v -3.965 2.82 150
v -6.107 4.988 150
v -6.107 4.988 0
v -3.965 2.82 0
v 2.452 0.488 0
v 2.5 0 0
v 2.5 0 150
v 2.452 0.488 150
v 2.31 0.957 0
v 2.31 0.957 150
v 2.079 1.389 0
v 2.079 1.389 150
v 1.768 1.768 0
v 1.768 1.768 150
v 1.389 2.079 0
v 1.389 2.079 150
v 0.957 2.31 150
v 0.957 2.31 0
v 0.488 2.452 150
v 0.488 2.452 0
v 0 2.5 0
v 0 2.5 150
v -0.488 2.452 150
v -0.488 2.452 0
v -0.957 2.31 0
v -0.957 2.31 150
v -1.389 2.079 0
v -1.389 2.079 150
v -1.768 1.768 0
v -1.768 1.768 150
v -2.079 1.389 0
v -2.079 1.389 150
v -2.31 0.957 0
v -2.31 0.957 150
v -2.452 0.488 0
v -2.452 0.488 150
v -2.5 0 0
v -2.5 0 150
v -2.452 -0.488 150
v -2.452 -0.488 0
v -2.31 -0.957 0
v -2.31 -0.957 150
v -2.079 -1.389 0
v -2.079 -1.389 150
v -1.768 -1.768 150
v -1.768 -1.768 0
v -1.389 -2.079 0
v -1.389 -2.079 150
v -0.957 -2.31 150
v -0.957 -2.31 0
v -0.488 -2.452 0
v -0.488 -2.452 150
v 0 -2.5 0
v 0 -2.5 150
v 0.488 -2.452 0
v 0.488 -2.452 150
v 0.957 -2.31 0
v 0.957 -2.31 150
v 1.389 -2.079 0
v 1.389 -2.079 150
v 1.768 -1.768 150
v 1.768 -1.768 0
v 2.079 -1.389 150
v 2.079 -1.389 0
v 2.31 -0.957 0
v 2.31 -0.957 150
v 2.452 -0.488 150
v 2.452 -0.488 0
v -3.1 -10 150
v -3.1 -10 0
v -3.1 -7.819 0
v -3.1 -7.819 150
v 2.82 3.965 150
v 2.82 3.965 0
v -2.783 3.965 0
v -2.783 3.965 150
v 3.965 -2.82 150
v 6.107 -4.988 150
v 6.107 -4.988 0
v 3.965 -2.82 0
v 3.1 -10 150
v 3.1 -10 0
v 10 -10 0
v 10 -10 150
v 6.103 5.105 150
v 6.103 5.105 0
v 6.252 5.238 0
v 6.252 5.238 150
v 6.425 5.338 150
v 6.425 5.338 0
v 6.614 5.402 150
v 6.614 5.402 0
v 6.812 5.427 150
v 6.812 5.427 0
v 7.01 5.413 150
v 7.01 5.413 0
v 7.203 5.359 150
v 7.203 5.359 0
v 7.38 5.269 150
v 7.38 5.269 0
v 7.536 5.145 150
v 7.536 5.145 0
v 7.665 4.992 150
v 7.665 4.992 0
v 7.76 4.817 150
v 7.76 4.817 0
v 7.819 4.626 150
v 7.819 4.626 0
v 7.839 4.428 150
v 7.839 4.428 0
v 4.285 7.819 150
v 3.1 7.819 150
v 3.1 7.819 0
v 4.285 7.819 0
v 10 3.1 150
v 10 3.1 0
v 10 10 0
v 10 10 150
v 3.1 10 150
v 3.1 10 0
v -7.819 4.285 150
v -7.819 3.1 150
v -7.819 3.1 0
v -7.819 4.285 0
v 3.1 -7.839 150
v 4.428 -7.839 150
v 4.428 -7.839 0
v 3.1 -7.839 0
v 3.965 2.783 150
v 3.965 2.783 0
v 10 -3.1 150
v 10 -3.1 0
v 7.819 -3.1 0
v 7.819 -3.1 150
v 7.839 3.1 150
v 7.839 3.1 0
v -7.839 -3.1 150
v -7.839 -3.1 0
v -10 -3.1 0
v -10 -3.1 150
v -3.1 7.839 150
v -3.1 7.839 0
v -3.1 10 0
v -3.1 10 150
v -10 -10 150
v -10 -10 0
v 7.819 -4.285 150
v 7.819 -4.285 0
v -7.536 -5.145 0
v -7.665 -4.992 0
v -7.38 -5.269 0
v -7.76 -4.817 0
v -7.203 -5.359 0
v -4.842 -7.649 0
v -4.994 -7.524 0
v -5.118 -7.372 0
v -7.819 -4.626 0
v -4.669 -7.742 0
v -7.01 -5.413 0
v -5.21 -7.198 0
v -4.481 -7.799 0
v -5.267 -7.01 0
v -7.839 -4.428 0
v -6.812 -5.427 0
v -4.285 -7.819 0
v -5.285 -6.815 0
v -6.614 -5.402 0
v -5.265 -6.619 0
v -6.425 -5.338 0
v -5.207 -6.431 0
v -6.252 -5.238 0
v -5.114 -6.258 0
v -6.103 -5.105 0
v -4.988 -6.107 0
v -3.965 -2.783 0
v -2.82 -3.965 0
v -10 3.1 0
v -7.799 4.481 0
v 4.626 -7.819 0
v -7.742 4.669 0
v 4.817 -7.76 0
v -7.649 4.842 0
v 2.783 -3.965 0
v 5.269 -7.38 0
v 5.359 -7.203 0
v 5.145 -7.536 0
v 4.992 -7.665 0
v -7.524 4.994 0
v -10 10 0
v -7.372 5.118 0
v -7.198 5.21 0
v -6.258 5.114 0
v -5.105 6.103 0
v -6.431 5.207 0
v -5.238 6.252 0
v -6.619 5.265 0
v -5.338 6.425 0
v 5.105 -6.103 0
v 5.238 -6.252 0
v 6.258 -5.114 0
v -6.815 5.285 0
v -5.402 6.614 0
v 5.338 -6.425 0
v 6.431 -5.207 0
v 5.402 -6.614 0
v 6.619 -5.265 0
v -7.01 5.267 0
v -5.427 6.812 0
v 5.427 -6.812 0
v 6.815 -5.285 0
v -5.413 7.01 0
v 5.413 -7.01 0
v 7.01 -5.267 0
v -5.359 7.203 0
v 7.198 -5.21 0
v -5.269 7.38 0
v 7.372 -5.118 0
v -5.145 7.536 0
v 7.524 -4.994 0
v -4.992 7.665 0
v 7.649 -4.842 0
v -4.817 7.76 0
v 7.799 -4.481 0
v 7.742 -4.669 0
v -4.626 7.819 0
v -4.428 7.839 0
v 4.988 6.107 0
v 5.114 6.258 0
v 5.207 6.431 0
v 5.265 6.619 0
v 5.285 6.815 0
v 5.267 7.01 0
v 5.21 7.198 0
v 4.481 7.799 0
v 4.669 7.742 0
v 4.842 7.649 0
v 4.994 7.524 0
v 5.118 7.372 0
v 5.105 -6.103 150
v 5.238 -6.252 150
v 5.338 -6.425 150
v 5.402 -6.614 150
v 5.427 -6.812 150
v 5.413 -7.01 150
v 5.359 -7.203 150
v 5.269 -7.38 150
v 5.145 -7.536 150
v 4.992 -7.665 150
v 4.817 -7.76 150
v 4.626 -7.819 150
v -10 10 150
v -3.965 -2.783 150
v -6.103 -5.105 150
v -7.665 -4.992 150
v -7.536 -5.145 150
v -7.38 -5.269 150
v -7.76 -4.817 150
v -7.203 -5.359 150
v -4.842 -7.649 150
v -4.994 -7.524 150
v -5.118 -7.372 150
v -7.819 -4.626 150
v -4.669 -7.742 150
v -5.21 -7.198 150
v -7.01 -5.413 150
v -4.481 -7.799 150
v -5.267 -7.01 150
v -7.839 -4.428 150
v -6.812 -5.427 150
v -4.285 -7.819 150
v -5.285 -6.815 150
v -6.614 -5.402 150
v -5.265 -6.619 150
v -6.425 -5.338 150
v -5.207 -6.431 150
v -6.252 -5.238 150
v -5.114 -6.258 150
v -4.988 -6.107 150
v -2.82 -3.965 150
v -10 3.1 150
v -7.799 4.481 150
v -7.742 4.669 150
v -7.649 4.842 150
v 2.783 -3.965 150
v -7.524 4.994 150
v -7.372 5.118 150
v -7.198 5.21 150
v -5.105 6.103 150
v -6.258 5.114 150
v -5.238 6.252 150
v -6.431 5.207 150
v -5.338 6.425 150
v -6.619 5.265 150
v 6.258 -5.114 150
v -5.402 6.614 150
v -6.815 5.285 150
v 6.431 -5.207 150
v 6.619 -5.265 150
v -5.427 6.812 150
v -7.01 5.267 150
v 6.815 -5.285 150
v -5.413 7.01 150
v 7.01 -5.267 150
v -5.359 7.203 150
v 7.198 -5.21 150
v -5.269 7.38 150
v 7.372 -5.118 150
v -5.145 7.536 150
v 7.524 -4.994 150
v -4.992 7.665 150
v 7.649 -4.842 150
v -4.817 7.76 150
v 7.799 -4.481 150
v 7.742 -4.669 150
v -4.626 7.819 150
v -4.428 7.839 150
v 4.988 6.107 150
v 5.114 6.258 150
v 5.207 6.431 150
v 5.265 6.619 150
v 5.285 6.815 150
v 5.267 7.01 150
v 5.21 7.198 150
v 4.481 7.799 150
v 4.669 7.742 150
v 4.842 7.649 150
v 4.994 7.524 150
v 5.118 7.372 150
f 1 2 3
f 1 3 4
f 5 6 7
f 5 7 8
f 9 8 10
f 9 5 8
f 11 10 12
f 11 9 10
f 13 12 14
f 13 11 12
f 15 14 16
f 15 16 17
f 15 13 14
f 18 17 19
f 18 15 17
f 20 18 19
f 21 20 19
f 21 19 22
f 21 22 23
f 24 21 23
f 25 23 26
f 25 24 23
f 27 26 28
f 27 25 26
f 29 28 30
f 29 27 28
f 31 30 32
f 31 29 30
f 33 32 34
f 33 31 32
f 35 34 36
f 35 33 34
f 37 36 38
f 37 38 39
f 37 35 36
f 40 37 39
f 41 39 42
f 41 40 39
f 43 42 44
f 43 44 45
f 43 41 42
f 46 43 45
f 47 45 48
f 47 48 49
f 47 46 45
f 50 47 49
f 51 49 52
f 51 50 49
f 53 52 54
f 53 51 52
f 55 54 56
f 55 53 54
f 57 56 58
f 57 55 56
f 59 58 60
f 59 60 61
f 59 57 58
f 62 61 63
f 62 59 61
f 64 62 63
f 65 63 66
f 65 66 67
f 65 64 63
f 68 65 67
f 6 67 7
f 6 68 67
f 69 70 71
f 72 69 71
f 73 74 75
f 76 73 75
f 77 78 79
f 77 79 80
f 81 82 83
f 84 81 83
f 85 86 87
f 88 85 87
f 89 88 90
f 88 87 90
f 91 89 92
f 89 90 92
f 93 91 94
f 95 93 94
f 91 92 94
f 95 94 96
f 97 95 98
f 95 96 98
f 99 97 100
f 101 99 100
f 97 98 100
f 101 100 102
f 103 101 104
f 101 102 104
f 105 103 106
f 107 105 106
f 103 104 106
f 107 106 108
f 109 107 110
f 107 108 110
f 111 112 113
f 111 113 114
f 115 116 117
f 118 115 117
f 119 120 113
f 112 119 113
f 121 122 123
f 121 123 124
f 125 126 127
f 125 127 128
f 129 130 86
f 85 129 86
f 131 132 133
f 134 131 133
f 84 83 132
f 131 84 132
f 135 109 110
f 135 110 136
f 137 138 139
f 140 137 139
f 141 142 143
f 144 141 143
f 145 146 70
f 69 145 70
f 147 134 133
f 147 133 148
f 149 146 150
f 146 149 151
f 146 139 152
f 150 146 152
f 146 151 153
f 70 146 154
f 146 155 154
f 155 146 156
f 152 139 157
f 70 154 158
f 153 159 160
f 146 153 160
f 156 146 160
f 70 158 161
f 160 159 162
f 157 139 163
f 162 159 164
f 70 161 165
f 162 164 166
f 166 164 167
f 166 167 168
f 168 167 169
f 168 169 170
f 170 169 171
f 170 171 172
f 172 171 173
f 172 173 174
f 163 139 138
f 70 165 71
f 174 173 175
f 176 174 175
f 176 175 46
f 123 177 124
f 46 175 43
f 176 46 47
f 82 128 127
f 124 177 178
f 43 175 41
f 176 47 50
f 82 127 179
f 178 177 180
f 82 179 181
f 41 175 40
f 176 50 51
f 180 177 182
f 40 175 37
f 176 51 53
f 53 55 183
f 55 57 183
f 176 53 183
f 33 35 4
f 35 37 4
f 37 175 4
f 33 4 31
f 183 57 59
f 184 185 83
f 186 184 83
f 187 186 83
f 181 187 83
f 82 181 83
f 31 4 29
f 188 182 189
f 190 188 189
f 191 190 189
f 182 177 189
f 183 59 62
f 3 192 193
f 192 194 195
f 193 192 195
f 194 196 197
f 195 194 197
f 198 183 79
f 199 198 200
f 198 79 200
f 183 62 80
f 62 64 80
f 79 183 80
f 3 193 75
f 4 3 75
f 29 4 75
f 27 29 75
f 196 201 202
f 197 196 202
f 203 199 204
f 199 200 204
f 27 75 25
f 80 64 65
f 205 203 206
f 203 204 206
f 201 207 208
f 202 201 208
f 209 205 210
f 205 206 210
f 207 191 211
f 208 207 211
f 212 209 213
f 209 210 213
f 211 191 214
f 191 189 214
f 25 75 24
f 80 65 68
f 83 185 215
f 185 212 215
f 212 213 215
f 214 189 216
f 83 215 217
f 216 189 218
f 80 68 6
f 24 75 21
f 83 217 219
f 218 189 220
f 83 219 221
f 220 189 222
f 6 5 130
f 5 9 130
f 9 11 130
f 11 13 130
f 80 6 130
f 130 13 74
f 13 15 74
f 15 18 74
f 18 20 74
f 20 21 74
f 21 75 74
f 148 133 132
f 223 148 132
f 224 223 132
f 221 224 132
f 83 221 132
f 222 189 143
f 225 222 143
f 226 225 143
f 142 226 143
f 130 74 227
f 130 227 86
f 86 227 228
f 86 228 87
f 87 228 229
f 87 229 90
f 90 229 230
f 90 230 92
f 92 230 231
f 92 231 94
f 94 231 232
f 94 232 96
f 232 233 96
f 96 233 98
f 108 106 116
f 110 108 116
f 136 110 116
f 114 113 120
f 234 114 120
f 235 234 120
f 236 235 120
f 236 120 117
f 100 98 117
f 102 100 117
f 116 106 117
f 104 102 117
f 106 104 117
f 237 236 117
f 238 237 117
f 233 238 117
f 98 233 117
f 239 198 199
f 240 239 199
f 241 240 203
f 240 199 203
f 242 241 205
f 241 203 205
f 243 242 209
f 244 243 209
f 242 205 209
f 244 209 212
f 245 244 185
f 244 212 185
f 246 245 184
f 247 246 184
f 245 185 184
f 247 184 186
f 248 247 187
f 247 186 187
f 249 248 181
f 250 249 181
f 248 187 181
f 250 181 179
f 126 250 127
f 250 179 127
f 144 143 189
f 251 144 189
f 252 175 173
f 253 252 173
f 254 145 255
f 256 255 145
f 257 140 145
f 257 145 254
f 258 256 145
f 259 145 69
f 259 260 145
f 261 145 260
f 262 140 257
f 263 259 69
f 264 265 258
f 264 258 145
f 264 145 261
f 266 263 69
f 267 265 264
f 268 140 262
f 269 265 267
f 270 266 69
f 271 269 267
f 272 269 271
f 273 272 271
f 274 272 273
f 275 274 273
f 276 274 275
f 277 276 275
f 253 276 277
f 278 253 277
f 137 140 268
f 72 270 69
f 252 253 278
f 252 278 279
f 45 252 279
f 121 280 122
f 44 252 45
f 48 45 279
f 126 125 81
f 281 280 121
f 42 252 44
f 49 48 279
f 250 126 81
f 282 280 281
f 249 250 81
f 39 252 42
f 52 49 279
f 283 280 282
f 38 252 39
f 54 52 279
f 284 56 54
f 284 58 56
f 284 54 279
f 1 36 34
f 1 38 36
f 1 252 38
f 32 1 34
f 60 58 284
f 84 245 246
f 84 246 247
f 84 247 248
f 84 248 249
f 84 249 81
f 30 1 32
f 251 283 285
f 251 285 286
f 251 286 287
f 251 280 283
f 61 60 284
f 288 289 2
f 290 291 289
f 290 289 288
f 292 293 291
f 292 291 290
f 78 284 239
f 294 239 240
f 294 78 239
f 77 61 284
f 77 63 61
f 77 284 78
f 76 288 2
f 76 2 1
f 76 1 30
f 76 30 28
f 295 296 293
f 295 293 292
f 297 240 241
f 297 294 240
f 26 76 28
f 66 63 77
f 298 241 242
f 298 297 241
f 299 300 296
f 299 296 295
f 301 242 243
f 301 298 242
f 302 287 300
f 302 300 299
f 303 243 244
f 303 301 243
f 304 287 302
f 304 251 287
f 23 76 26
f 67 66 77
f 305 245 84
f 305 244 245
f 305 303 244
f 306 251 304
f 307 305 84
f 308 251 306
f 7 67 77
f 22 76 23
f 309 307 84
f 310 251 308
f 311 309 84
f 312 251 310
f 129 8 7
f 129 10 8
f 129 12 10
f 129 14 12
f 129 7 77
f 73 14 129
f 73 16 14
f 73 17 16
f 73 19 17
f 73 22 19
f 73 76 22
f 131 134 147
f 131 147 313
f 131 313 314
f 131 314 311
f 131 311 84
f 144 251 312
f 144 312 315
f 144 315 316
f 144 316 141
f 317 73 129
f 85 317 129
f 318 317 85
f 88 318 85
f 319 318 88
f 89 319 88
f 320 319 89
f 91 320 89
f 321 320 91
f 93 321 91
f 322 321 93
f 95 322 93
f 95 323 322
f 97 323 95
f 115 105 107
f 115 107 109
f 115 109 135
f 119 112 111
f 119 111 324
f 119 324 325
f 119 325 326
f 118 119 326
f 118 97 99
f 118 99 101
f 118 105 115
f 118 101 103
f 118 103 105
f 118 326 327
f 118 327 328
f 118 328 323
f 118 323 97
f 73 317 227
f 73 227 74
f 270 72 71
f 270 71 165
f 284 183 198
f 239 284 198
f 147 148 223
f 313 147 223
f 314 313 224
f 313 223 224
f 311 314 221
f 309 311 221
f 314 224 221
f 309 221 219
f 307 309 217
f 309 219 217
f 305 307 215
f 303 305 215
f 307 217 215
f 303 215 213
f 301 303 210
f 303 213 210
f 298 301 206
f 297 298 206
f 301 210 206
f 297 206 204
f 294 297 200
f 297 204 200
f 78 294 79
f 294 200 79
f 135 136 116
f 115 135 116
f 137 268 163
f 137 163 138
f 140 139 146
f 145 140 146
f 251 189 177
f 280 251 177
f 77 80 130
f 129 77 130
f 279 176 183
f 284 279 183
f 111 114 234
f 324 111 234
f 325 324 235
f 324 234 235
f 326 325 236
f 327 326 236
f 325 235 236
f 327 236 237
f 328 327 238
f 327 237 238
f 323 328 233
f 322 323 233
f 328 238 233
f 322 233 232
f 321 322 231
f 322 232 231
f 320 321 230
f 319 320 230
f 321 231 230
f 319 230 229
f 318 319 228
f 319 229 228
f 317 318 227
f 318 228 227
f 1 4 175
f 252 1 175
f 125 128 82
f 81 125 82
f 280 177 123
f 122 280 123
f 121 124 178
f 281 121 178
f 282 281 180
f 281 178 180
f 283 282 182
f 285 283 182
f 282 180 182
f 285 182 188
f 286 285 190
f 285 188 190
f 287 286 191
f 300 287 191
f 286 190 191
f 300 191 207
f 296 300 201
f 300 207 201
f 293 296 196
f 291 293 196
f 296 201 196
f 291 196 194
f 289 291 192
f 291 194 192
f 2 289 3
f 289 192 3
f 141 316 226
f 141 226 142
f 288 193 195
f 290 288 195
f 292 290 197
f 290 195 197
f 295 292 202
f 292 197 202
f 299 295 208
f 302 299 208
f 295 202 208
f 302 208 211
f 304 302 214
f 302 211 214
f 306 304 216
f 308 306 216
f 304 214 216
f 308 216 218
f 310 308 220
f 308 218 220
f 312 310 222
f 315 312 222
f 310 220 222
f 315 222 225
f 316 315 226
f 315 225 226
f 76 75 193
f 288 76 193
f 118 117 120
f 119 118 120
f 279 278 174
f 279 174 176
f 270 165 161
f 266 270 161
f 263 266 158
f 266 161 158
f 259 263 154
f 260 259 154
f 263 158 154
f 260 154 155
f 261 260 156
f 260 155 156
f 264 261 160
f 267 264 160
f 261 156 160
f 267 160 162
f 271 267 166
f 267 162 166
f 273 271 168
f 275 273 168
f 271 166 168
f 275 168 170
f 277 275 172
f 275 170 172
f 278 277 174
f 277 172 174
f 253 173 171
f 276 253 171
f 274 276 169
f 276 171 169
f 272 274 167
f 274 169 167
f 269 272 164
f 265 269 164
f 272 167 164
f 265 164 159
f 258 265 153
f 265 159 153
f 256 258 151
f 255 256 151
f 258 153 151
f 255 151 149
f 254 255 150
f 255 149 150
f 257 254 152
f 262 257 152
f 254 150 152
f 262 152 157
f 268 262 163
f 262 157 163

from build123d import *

# Parameters (mm, degrees)
SKETCH2_R           = 2.5
BOSS_EXTRUDE1_DEPTH = 150


with BuildPart() as part:
    # Sketch2 → Boss-Extrude1 (new body)
    with BuildSketch(Plane.XY):
        with BuildLine():
            Line((-10, -10), (-3.1, -10))
            Line((-3.1, -10), (-3.1, -7.81857447))
            Line((-3.1, -7.81857447), (-4.285374034, -7.81857447))
            ThreePointArc((-4.285374034, -7.81857447), (-5.210402021, -7.198473435), (-4.988208383, -6.107220917))
            Line((-4.988208383, -6.107220917), (-2.819718275, -3.96470075))
            Line((-2.819718275, -3.96470075), (0, -3.96470075))
            Line((0, -3.96470075), (2.782738033, -3.96470075))
            Line((2.782738033, -3.96470075), (5.105242131, -6.103332486))
            ThreePointArc((5.105242131, -6.103332486), (5.359419929, -7.202533996), (4.427854938, -7.838959152))
            Line((4.427854938, -7.838959152), (3.1, -7.838959152))
            Line((3.1, -7.838959152), (3.1, -10))
            Line((3.1, -10), (10, -10))
            Line((10, -10), (10, -3.1))
            Line((10, -3.1), (7.81857447, -3.1))
            Line((7.81857447, -3.1), (7.81857447, -4.285374034))
            ThreePointArc((7.81857447, -4.285374034), (7.198473435, -5.210402021), (6.107220917, -4.988208383))
            Line((6.107220917, -4.988208383), (3.96470075, -2.819718275))
            Line((3.96470075, -2.819718275), (3.96470075, 0))
            Line((3.96470075, 0), (3.96470075, 2.782738033))
            Line((3.96470075, 2.782738033), (6.103332486, 5.105242131))
            ThreePointArc((6.103332486, 5.105242131), (7.202533996, 5.359419929), (7.838959152, 4.427854938))
            Line((7.838959152, 4.427854938), (7.838959152, 3.1))
            Line((7.838959152, 3.1), (10, 3.1))
            Line((10, 3.1), (10, 10))
            Line((10, 10), (3.1, 10))
            Line((3.1, 10), (3.1, 7.81857447))
            Line((3.1, 7.81857447), (4.285374034, 7.81857447))
            ThreePointArc((4.285374034, 7.81857447), (5.210402021, 7.198473435), (4.988208383, 6.107220917))
            Line((4.988208383, 6.107220917), (2.819718275, 3.96470075))
            Line((2.819718275, 3.96470075), (0, 3.96470075))
            Line((0, 3.96470075), (-2.782738033, 3.96470075))
            Line((-2.782738033, 3.96470075), (-5.105242131, 6.103332486))
            ThreePointArc((-5.105242131, 6.103332486), (-5.359419929, 7.202533996), (-4.427854938, 7.838959152))
            Line((-4.427854938, 7.838959152), (-3.1, 7.838959152))
            Line((-3.1, 7.838959152), (-3.1, 10))
            Line((-3.1, 10), (-10, 10))
            Line((-10, 10), (-10, 3.1))
            Line((-10, 3.1), (-7.81857447, 3.1))
            Line((-7.81857447, 3.1), (-7.81857447, 4.285374034))
            ThreePointArc((-7.81857447, 4.285374034), (-7.198473435, 5.210402021), (-6.107220917, 4.988208383))
            Line((-6.107220917, 4.988208383), (-3.96470075, 2.819718275))
            Line((-3.96470075, 2.819718275), (-3.96470075, 0))
            Line((-3.96470075, 0), (-3.96470075, -2.782738033))
            Line((-3.96470075, -2.782738033), (-6.103332486, -5.105242131))
            ThreePointArc((-6.103332486, -5.105242131), (-7.202533996, -5.359419929), (-7.838959152, -4.427854938))
            Line((-7.838959152, -4.427854938), (-7.838959152, -3.1))
            Line((-7.838959152, -3.1), (-10, -3.1))
            Line((-10, -3.1), (-10, -10))
        make_face()
        Circle(SKETCH2_R, mode=Mode.SUBTRACT)
    extrude(amount=BOSS_EXTRUDE1_DEPTH)


solid = part.part
